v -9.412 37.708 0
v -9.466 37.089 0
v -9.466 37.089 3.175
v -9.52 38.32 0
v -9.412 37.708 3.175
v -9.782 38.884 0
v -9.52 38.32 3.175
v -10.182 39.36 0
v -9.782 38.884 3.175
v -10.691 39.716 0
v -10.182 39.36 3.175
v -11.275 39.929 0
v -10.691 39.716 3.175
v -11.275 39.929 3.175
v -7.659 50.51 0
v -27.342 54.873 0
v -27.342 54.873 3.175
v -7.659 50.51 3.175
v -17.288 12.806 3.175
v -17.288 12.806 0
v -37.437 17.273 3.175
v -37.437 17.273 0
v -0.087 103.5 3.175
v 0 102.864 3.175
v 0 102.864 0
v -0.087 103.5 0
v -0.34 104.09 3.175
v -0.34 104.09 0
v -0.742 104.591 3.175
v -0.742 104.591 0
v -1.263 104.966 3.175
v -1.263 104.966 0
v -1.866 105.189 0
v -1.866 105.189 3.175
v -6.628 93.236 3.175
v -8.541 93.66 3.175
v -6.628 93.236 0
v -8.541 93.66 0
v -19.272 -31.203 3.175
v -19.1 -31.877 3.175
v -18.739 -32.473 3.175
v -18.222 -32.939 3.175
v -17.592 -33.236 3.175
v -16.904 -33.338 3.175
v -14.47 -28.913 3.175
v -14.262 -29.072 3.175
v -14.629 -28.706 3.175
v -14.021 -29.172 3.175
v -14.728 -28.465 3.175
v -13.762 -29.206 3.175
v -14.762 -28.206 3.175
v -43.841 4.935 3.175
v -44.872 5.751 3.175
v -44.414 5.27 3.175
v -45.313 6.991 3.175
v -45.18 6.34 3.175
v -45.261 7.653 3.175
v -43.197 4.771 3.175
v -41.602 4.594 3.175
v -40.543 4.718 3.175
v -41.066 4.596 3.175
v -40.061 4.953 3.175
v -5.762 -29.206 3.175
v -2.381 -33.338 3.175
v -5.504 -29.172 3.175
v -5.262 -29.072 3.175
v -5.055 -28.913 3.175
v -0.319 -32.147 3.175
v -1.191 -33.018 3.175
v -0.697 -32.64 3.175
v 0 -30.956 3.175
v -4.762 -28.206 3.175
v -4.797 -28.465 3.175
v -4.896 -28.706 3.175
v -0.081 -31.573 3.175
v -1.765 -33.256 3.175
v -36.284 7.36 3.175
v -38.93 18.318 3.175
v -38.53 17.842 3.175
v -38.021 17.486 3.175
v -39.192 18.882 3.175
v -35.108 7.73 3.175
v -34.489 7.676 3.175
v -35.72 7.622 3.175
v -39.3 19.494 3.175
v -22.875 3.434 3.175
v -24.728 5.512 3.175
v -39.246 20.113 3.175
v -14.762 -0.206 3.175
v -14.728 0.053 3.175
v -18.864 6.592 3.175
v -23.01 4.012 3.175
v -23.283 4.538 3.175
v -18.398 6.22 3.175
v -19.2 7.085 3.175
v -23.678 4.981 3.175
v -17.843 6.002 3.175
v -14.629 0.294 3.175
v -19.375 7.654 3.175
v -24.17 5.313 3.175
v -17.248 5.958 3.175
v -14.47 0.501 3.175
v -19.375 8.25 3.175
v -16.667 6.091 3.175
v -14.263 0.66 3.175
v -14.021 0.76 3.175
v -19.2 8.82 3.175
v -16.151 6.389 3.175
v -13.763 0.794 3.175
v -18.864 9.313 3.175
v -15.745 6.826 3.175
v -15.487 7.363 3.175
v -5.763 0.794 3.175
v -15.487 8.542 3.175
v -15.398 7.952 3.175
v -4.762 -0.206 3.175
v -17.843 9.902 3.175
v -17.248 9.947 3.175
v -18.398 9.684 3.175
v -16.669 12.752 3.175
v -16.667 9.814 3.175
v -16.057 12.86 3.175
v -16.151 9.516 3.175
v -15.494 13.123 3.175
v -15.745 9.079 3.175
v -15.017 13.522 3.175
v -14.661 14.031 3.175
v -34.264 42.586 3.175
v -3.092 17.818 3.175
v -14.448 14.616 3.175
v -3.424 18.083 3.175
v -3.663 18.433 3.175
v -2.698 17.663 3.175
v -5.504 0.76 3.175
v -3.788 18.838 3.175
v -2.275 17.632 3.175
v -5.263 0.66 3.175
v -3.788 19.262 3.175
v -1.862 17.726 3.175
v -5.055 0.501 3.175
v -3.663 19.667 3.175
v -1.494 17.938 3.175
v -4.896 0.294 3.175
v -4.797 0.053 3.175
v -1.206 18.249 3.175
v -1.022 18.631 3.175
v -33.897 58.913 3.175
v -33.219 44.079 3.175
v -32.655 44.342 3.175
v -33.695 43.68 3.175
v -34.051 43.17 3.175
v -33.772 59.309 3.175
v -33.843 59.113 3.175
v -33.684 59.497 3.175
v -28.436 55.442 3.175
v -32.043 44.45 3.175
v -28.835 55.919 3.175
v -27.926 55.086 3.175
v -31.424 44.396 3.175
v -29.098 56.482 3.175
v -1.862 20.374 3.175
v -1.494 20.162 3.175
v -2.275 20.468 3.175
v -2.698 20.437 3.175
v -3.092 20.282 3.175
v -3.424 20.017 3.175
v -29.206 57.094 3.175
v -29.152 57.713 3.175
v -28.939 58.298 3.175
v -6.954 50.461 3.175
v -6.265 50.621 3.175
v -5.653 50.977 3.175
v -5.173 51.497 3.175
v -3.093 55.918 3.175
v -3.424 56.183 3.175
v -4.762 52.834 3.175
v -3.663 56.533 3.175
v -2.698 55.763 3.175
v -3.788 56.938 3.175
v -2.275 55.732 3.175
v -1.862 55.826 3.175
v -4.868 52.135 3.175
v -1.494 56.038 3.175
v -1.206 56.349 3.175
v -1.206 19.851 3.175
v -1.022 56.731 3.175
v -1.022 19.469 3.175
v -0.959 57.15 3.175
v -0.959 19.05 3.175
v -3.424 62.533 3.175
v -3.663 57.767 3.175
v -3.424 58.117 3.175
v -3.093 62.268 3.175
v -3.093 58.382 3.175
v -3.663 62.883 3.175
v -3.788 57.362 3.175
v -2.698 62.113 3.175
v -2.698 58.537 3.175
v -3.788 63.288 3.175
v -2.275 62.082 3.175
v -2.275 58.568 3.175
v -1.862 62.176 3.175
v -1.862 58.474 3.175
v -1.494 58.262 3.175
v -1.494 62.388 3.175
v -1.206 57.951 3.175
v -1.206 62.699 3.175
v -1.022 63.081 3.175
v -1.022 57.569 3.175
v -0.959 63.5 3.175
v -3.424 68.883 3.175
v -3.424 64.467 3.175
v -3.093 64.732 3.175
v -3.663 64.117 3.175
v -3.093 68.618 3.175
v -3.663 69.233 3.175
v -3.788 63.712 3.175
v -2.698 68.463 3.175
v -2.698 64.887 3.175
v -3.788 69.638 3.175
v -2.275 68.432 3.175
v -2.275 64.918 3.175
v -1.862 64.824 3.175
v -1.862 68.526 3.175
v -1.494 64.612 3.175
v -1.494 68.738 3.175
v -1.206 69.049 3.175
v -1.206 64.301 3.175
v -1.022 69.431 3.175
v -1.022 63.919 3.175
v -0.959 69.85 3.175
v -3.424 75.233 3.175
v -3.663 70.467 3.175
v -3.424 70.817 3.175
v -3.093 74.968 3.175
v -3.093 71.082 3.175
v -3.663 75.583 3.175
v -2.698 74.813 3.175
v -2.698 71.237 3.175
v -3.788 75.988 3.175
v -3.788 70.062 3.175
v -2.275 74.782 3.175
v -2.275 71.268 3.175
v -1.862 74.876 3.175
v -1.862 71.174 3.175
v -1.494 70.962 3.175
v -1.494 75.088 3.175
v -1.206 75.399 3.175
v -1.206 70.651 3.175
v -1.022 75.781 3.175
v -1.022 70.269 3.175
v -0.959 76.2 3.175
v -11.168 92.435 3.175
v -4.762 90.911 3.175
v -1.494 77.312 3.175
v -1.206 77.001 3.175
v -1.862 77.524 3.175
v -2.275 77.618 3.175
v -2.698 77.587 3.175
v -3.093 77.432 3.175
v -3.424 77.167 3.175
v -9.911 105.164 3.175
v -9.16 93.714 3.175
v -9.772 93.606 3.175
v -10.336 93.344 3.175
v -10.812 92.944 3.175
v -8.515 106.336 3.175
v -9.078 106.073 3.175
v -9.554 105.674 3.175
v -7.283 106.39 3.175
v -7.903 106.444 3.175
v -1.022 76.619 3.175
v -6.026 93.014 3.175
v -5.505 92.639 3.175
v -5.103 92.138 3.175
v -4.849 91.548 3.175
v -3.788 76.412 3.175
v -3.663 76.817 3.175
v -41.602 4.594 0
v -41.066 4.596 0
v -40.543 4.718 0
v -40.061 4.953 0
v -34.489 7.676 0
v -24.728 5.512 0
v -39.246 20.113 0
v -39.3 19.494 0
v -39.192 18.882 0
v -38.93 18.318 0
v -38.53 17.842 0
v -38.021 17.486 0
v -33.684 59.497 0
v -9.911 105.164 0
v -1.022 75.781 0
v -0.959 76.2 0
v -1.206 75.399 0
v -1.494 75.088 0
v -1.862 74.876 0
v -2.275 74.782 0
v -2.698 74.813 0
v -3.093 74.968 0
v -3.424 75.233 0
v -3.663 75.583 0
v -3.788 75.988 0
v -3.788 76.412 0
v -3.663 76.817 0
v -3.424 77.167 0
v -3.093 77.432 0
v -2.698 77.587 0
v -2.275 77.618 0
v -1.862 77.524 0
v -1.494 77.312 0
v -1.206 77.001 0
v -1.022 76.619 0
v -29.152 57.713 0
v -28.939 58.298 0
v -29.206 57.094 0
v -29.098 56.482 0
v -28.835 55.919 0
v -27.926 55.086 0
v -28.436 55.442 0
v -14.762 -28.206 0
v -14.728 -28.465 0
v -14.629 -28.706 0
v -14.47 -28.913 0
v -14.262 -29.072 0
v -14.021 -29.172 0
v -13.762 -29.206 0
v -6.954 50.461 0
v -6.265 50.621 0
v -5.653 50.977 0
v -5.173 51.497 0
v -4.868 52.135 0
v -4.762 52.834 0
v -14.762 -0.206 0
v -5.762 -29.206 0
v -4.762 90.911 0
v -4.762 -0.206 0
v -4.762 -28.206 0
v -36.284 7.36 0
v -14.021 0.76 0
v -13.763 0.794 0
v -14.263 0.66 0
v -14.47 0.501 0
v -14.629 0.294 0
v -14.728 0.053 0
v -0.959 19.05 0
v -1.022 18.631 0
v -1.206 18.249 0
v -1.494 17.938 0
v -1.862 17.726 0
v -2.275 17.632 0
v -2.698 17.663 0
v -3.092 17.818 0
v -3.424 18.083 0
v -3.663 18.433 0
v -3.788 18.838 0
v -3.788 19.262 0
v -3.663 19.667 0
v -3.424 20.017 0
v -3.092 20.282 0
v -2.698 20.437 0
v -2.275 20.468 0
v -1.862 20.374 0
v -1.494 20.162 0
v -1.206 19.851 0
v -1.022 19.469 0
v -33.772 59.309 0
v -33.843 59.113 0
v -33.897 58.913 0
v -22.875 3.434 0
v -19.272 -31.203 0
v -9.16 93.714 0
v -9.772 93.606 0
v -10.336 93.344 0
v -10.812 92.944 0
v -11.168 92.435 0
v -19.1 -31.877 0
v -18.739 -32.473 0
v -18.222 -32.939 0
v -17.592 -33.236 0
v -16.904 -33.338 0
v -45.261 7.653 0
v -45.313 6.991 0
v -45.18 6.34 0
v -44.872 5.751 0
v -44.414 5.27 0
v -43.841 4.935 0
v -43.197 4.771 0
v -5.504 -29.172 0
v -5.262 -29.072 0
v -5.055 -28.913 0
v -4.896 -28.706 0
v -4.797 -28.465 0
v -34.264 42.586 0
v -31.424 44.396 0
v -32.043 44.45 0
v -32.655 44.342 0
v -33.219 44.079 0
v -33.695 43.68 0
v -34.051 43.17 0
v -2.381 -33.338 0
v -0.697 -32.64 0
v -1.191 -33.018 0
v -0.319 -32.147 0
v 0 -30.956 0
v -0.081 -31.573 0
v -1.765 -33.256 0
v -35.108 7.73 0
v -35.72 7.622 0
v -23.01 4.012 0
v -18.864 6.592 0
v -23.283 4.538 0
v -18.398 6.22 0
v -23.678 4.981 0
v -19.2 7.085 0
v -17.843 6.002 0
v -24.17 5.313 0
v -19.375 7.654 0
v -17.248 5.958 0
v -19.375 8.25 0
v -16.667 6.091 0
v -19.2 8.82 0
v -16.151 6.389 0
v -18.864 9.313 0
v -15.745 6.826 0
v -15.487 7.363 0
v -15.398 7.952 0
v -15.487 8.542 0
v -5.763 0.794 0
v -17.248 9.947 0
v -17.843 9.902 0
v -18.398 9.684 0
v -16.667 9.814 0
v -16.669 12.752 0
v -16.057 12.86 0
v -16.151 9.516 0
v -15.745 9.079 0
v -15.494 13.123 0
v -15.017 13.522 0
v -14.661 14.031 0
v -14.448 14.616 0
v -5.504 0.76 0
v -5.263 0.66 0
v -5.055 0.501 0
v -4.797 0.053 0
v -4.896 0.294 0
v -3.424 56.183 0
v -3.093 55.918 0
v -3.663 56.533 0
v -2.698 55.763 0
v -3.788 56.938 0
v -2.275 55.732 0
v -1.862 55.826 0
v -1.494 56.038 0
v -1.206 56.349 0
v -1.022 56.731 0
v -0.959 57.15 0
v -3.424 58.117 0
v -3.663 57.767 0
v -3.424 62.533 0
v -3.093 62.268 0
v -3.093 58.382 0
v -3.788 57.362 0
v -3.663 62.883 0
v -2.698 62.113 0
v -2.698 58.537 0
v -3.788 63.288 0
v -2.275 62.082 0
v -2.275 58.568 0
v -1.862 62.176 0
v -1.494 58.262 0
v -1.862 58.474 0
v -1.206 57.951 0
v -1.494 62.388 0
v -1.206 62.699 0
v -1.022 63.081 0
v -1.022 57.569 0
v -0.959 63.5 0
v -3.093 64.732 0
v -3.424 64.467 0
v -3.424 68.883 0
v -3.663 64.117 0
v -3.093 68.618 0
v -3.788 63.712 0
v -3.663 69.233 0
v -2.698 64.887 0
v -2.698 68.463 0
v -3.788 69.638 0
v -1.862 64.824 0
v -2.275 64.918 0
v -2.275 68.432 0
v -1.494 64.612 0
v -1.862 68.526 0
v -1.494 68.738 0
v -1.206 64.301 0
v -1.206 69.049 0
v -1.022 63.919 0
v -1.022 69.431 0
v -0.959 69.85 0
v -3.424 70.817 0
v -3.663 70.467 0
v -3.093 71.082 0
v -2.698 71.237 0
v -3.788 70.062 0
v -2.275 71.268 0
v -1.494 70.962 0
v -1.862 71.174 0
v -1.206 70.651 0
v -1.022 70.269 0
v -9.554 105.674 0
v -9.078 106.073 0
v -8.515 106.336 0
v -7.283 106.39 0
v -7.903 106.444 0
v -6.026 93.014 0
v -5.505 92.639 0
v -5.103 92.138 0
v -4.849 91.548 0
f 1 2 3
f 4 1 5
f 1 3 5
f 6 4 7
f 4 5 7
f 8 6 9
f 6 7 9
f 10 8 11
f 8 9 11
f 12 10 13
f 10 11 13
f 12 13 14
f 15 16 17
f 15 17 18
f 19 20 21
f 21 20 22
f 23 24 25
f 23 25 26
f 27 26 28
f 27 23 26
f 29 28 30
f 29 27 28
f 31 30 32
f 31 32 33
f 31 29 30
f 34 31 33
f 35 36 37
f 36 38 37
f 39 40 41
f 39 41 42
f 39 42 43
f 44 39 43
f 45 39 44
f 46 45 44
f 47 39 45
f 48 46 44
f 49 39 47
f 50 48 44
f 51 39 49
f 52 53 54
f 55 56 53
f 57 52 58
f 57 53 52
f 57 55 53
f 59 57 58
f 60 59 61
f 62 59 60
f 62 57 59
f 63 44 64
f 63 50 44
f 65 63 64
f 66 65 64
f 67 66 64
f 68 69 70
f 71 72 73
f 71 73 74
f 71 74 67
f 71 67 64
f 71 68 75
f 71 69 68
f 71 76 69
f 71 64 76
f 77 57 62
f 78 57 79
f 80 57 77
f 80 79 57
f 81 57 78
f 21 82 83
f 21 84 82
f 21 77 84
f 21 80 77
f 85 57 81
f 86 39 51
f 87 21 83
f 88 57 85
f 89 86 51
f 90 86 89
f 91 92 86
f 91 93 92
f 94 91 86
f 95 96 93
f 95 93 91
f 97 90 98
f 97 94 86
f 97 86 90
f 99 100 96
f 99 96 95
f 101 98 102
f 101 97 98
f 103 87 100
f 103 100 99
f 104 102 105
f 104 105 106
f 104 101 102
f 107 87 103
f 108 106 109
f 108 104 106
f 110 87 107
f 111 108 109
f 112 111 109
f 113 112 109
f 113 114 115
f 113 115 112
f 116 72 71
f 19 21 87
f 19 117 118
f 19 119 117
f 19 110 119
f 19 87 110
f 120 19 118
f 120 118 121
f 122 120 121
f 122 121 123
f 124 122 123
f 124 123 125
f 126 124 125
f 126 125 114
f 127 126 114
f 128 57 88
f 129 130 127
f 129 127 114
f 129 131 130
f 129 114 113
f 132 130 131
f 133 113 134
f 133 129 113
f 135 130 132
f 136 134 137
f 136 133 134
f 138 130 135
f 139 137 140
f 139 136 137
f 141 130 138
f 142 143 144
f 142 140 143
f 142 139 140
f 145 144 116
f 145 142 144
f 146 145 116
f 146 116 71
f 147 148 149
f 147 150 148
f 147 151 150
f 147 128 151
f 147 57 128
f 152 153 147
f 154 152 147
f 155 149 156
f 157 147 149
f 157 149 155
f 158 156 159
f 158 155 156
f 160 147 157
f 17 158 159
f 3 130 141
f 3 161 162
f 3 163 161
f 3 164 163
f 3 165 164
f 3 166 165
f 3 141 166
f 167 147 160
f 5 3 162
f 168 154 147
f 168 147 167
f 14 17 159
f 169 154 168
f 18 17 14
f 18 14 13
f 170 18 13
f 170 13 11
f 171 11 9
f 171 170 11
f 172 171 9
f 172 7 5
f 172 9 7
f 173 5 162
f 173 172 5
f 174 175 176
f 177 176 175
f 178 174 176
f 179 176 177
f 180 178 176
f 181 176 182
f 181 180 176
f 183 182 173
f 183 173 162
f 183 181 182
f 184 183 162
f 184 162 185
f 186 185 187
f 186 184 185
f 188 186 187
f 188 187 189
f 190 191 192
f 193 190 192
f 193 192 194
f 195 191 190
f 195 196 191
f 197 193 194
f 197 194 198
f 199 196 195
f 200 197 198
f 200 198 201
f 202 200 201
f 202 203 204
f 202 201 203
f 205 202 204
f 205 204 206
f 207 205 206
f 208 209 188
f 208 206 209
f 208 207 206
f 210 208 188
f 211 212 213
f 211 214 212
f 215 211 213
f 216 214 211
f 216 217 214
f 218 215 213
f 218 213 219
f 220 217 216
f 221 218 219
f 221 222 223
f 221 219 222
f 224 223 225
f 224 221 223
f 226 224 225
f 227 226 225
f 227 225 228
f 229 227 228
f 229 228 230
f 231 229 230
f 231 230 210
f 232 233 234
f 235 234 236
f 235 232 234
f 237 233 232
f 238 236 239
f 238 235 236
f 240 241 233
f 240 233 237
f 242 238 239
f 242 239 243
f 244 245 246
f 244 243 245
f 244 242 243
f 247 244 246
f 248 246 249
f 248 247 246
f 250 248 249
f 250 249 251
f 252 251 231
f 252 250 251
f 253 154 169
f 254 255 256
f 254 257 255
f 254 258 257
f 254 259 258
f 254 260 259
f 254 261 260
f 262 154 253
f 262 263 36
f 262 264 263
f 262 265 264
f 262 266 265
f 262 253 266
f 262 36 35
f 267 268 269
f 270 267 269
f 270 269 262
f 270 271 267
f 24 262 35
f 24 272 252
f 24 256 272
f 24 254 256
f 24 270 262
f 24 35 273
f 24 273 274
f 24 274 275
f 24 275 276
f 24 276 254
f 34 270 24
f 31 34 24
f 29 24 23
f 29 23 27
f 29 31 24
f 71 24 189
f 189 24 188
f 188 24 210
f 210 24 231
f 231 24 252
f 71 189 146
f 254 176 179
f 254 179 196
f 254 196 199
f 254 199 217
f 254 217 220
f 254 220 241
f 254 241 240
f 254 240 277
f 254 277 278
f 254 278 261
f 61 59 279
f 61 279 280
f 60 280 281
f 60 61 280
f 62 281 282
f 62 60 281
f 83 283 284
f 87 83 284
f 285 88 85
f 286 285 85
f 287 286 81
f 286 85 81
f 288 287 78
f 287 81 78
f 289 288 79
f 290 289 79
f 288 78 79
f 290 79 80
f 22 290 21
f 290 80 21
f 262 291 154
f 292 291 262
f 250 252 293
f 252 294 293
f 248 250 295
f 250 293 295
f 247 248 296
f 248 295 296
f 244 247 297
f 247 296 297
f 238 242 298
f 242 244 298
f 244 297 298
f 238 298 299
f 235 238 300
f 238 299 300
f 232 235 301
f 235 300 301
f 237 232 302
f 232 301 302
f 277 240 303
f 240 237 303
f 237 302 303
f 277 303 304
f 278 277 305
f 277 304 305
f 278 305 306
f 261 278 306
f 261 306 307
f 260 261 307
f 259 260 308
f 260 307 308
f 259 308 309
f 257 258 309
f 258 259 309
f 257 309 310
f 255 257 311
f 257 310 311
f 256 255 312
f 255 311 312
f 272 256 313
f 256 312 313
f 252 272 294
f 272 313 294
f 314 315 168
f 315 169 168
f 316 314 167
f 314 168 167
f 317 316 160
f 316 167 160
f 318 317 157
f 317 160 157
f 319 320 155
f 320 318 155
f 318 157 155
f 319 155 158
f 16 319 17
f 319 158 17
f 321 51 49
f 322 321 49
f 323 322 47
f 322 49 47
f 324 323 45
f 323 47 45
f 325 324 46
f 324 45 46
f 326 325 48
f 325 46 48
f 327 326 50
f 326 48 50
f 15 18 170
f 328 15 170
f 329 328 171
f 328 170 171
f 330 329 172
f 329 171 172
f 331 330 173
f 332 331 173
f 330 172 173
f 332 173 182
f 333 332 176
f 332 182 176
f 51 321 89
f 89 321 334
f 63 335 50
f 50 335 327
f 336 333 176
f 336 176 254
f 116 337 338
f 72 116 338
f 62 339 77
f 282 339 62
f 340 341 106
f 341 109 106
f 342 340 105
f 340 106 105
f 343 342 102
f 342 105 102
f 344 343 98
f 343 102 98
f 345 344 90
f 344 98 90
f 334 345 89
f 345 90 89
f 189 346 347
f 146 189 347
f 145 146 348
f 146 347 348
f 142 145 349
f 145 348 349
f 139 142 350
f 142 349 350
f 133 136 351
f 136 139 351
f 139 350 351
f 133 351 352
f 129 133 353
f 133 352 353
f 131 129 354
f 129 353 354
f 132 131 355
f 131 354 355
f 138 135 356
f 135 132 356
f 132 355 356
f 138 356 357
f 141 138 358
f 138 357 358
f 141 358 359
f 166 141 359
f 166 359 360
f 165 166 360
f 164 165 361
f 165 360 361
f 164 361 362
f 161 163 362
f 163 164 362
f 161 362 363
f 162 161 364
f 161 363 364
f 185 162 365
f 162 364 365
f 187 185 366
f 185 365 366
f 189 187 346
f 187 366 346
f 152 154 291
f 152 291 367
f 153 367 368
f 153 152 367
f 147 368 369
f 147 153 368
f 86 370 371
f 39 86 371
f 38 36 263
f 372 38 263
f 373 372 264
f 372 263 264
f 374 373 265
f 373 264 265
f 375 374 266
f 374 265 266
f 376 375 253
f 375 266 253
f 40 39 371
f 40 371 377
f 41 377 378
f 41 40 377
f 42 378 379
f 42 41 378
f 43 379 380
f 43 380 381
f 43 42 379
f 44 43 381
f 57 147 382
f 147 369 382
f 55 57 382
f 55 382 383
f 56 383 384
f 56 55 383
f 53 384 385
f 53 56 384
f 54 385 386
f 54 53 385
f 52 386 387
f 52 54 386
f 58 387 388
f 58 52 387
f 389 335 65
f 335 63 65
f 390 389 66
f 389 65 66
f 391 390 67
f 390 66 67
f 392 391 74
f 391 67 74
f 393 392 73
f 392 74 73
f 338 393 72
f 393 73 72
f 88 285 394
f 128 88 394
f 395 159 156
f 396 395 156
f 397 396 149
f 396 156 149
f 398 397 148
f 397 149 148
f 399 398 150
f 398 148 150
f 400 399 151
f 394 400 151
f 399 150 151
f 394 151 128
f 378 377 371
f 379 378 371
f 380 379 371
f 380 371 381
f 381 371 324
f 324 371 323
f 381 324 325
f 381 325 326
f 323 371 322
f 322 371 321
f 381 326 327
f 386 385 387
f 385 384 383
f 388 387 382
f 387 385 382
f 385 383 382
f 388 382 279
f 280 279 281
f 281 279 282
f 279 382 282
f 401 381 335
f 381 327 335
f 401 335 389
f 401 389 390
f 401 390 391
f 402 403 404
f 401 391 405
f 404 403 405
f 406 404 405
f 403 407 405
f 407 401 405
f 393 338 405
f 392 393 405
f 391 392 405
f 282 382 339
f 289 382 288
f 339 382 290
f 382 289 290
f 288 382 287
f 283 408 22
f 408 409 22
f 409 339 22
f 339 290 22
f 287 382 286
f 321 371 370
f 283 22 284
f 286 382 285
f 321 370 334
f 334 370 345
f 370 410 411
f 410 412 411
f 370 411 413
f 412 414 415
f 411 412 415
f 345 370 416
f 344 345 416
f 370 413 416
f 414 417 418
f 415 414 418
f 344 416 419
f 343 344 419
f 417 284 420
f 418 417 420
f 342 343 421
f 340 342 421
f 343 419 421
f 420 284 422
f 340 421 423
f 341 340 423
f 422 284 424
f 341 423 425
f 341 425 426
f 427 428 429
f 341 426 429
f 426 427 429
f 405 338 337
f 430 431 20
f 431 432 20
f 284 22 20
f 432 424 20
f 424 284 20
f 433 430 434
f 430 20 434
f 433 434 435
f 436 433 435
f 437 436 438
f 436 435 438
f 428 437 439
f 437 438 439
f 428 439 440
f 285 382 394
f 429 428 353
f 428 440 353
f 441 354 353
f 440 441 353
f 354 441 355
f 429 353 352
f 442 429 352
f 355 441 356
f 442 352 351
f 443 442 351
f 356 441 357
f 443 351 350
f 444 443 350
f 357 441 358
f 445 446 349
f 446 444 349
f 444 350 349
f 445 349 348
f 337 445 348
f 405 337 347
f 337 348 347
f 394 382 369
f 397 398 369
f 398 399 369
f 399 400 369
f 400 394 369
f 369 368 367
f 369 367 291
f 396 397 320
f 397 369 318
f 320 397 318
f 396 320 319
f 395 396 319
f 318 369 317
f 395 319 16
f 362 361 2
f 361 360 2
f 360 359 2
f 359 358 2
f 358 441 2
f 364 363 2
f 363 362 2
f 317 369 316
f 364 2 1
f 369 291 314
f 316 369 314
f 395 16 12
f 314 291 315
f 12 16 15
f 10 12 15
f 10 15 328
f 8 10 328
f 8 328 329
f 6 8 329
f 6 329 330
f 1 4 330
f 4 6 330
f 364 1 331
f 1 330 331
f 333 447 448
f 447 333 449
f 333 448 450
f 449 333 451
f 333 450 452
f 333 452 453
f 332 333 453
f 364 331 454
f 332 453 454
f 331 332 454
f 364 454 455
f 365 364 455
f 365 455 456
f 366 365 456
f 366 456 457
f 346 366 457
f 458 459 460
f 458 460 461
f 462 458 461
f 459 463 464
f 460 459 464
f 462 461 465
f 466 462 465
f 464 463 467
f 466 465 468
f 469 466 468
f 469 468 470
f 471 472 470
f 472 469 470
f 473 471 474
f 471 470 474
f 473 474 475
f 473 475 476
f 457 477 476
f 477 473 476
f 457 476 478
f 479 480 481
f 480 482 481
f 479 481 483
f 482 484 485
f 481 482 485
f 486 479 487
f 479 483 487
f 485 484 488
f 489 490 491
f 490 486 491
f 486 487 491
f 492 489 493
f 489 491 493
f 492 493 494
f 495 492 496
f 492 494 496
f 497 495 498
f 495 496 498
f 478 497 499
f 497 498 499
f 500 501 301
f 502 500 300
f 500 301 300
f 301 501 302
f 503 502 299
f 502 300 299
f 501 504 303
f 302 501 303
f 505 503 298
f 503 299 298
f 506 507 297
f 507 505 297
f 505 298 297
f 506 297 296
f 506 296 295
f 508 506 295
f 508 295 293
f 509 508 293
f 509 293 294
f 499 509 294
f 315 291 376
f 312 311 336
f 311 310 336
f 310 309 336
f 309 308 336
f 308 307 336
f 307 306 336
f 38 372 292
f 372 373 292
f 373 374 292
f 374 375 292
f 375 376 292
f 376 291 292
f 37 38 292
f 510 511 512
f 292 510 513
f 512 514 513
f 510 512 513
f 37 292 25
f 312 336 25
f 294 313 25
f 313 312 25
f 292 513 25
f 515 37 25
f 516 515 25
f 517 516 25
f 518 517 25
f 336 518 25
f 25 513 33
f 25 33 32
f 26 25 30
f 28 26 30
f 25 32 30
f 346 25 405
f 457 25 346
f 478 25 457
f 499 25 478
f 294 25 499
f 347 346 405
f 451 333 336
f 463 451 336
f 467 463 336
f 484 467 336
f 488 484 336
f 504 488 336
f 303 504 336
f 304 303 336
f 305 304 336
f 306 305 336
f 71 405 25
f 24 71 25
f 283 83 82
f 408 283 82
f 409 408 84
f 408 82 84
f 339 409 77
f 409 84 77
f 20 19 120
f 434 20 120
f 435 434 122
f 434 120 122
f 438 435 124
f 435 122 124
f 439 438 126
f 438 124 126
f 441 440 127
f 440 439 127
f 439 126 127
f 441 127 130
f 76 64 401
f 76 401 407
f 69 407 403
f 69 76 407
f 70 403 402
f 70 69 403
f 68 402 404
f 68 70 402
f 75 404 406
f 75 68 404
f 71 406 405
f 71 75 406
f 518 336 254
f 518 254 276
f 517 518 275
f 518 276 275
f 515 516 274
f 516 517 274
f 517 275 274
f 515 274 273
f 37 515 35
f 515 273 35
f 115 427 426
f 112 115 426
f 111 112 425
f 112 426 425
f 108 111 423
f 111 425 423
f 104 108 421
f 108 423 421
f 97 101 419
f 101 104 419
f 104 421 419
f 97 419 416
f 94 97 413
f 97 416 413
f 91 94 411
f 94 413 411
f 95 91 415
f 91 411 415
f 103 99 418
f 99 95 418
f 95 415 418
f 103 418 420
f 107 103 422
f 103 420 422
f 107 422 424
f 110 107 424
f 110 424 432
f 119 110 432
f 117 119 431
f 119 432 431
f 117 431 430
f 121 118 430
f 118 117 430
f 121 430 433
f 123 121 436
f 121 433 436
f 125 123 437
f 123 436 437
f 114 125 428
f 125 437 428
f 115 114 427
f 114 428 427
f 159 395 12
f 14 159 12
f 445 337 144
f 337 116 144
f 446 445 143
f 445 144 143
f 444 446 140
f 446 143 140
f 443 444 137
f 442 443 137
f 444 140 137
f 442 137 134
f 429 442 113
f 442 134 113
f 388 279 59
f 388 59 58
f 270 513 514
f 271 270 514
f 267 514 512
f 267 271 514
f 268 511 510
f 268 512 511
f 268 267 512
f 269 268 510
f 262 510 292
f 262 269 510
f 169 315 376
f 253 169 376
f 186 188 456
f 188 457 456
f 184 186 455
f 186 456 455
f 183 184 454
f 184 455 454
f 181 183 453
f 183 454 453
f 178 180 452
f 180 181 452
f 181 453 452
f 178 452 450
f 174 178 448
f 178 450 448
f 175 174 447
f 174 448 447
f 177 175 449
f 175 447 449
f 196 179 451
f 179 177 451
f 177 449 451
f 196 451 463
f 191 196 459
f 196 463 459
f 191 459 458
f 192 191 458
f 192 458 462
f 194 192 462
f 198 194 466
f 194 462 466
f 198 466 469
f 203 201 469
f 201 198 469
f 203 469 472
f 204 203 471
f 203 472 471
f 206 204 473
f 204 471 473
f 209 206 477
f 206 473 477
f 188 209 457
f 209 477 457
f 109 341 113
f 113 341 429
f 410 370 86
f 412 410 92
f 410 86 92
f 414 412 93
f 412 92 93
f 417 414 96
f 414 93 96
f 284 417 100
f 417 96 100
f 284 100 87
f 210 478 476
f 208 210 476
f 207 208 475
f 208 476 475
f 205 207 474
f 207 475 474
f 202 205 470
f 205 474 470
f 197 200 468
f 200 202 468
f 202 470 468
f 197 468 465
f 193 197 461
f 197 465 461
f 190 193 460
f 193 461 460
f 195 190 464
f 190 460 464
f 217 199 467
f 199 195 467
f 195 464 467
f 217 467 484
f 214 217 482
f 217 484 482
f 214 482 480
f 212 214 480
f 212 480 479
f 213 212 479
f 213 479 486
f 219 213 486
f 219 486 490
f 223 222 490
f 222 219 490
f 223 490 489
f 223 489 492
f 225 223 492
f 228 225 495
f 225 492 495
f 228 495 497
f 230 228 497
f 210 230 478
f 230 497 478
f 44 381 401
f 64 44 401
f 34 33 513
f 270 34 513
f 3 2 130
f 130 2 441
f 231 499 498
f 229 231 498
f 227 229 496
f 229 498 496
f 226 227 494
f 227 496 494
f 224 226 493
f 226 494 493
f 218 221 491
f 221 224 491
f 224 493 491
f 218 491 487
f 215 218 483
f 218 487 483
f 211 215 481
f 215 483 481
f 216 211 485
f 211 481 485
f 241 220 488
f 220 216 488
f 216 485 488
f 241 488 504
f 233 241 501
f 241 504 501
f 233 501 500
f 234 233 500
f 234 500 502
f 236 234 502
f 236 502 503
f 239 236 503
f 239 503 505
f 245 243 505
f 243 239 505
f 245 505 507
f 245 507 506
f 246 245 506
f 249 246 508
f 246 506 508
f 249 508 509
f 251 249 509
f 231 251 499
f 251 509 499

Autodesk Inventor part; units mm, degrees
ref_plane "YZ Plane" through (0, 0, 0) normal (1, 0, 0) x (0, 1, 0)
ref_plane "XZ Plane" through (0, 0, 0) normal (0, 1, 0) x (-1, 0, 0)
ref_plane "XY Plane" through (0, 0, 0) normal (0, 0, 1) x (1, 0, 0)
sketch "Sketch1" plane through (0, 0, 0) normal (0, 0, 1) x (1, 0, 0)
  line L0 (0, 0) -> (0, 136.2362)
  line L1 (-14.9636, 12.2907) -> (-39.7615, 17.7883)
  line L2 (-39.7615, 17.7883) -> (-33.7485, 44.911)
  line L3 (-33.7485, 44.911) -> (-8.9506, 39.4135)
  line L4 (-8.9506, 39.4135) -> (-14.9636, 12.2907)
  line L5 (-39.7615, 17.7883) -> (-8.9506, 39.4135) construction
  line L6 (-33.7485, 44.911) -> (-14.9636, 12.2907) construction
  circle A0 centre (-57.15, 12.7) radius 3.3401
  circle A1 centre (-57.15, 12.7) radius 6.35
  line L7 (0, 0) -> (-57.847, 6.3884)
  line L8 (-62.7825, 15.6321) -> (0, 136.2362)
  line L9 (-21.3496, 42.1622) -> (-27.3626, 15.0395) construction
  line L10 (0, 104.775) -> (-14.6831, 108.0302)
  line L11 (-35.4518, 7.8896) -> (-23.0529, 5.1408)
  line L12 (-23.0529, 5.1408) -> (-24.4273, -1.0586) construction
  line L13 (-24.4273, -1.0586) -> (-36.8262, 1.6901) construction
  line L14 (-36.8262, 1.6901) -> (-35.4518, 7.8896) construction
  line L15 (-35.4518, 7.8896) -> (-40.7688, 4.5023)
  line L16 (-8.9506, 39.4135) -> (-33.7485, 44.911)
  line L17 (-56.4271, 15.9609) -> (-57.15, 12.7) construction
  line L18 (-57.15, 12.7) -> (-60.4109, 13.4229) construction
  line L19 (-29.2523, 6.5152) -> (-36.1243, -24.4822) construction
  line L20 (-56.356, 15.9443) -> (-9.0672, 106.7852)
  line L21 (-35.1857, 56.612) -> (0, 48.8115)
  line L22 (-4.7625, 49.8673) -> (-4.7625, 105.8308)
  line L23 (-30.3721, 55.5448) -> (-10.3247, 94.0556)
  line L24 (-10.3247, 94.0556) -> (-4.7625, 92.8225)
  circle A2 centre (-17.3978, 7.9523) radius 2
  line L25 (0, 13.4938) -> (-4.7625, 13.4937) construction
  line L26 (-4.7625, 13.4937) -> (-4.7625, 24.6063) construction
  line L27 (-4.7625, 24.6063) -> (0, 24.6063) construction
  line L28 (0, 24.6063) -> (0, 13.4938) construction
  line L29 (-4.7625, 19.05) -> (0, 19.05) construction
  circle A3 centre (-2.3812, 19.05) radius 1.4224
  line L30 (-4.7625, 57.15) -> (0, 57.15) construction
  circle A4 centre (-2.3813, 57.15) radius 1.4224
  circle A5 centre (-2.3813, 63.5) radius 1.4224
  circle A6 centre (-2.3813, 69.85) radius 1.4224
  circle A7 centre (-2.3813, 76.2) radius 1.4224
  line L31 (-22.792, 92.4532) -> (-17.8635, 89.8876)
  circle A8 centre (-57.15, 12.7) radius 9.525 construction
  line L32 (-14.7625, 0.7937) -> (-4.7625, 0.7938)
  line L33 (-4.7625, 0.7938) -> (-4.7625, -29.2062)
  line L34 (-4.7625, -29.2062) -> (-14.7625, -29.2062)
  line L35 (-14.7625, -29.2062) -> (-14.7625, 0.7937)
  line L36 (-14.7625, 0.7937) -> (-4.7625, -29.2062) construction
  line L37 (-4.7625, 0.7938) -> (-14.7625, -29.2062) construction
  line L38 (-19.05, -33.3375) -> (0, -33.3375)
  line L39 (0, -33.3375) -> (0, 0)
  line L40 (-23.0529, 5.1408) -> (-19.05, -33.3375)
  circle A9 centre (-17.3978, 7.9523) radius 6.5 construction
  line L41 (-22.7129, 14.0087) -> (-24.6027, 5.4844) construction
  line L42 (-17.3978, 7.9523) -> (-23.8273, 9.3776) construction
  line L43 (-33.8287, 59.2189) -> (-45.835, 5.0618)
  point P0 (-24.3561, 28.6009)
  point P1 (-23.6144, 2.6079)
  point P2 (-36.3119, 4.0101)
  point P3 (-54.945, 18.6549)
  point P4 (0, 48.8115)
  point P5 (-24.3561, 28.6009)
  point P6 (-9.7625, -14.2062)
  dimension "d14" = 27.7812
  dimension "d15" = 25.4
  dimension "d16" = 12.5
  dimension "d17" = 6.6802
  dimension "d19" = 57.15
  dimension "d22" = 12.7
  dimension "d26" = 102.5
  dimension "d29" = 6.35
  dimension "d31" = 6.35
  dimension "d35" = 28.575
  dimension "d38" = 31.75
  dimension "d55" = 4.7625
  dimension "d56" = 4.7625
  dimension "d60" = 12.7
  dimension "d66" = 4
  dimension "d72" = 8.7312
  dimension "d80" = 104.775
  dimension "d85" = 4.7625
  dimension "d86" = 11.1125
  dimension "d87" = 2.8448
  dimension "d88" = 19.05
  dimension "d89" = 2.8448
  dimension "d90" = 38.1
  dimension "d93" = 6.35
  dimension "d104" = 27.5
  dimension "d105" = 5.5563
  dimension "d106" = 19.05
  dimension "d111" = 19.05
  dimension "d112" = 10
  dimension "d113" = 30
  dimension "d114" = 4.7625
  dimension "d115" = 0.7937
  dimension "d117" = 19.05
  dimension "d119" = 11.1125
  dimension "d120" = 12.7
  dimension "d121" = 33.3375
  dimension "d122" = 45
  dimension "d123" = 13
  dimension "d124" = 4.7625
  dimension "d125" = 4.7625
  dimension "d126" = 3.175
extrude "Extrusion1" add sketch "Sketch1" along normal blind 3.175 contours L7 L33 L32 L40 L11 L15 L43 L21 L0 | L39 L38 L40 L7 L32 L35 L34 L33 | L21 L22 L10 L0 | L22 L24 L23 L21 L43 L20 L10
fillet "Fillet1" radius 2.3813 17 edges at (-39.7615, 17.7883, 1.5875) (-14.9636, 12.2907, 1.5875) (-23.0529, 5.1408, 1.5875) (-35.4518, 7.8896, 1.5875) (-40.7688, 4.5023, 1.5875) (-4.7625, 92.8225, 1.5875) (-30.3721, 55.5448, 1.5875) (-4.7625, 49.8673, 1.5875) (-33.7485, 44.911, 1.5875) (-8.9506, 39.4135, 1.5875) (-19.05, -33.3375, 1.5875) (0, -33.3375, 1.5875) (-10.3247, 94.0556, 1.5875) (-33.8287, 59.2189, 1.5875) (-45.835, 5.0618, 1.5875) (-9.0672, 106.7852, 1.5875) (0, 104.775, 1.5875)
fillet "Fillet6" radius 1 4 edges at (-4.7625, 0.7938, 1.5875) (-14.7625, 0.7937, 1.5875) (-14.7625, -29.2062, 1.5875) (-4.7625, -29.2062, 1.5875)
equation "\"d56\" = d55"
properties part number "Uprights" material "Stainless Steel"
